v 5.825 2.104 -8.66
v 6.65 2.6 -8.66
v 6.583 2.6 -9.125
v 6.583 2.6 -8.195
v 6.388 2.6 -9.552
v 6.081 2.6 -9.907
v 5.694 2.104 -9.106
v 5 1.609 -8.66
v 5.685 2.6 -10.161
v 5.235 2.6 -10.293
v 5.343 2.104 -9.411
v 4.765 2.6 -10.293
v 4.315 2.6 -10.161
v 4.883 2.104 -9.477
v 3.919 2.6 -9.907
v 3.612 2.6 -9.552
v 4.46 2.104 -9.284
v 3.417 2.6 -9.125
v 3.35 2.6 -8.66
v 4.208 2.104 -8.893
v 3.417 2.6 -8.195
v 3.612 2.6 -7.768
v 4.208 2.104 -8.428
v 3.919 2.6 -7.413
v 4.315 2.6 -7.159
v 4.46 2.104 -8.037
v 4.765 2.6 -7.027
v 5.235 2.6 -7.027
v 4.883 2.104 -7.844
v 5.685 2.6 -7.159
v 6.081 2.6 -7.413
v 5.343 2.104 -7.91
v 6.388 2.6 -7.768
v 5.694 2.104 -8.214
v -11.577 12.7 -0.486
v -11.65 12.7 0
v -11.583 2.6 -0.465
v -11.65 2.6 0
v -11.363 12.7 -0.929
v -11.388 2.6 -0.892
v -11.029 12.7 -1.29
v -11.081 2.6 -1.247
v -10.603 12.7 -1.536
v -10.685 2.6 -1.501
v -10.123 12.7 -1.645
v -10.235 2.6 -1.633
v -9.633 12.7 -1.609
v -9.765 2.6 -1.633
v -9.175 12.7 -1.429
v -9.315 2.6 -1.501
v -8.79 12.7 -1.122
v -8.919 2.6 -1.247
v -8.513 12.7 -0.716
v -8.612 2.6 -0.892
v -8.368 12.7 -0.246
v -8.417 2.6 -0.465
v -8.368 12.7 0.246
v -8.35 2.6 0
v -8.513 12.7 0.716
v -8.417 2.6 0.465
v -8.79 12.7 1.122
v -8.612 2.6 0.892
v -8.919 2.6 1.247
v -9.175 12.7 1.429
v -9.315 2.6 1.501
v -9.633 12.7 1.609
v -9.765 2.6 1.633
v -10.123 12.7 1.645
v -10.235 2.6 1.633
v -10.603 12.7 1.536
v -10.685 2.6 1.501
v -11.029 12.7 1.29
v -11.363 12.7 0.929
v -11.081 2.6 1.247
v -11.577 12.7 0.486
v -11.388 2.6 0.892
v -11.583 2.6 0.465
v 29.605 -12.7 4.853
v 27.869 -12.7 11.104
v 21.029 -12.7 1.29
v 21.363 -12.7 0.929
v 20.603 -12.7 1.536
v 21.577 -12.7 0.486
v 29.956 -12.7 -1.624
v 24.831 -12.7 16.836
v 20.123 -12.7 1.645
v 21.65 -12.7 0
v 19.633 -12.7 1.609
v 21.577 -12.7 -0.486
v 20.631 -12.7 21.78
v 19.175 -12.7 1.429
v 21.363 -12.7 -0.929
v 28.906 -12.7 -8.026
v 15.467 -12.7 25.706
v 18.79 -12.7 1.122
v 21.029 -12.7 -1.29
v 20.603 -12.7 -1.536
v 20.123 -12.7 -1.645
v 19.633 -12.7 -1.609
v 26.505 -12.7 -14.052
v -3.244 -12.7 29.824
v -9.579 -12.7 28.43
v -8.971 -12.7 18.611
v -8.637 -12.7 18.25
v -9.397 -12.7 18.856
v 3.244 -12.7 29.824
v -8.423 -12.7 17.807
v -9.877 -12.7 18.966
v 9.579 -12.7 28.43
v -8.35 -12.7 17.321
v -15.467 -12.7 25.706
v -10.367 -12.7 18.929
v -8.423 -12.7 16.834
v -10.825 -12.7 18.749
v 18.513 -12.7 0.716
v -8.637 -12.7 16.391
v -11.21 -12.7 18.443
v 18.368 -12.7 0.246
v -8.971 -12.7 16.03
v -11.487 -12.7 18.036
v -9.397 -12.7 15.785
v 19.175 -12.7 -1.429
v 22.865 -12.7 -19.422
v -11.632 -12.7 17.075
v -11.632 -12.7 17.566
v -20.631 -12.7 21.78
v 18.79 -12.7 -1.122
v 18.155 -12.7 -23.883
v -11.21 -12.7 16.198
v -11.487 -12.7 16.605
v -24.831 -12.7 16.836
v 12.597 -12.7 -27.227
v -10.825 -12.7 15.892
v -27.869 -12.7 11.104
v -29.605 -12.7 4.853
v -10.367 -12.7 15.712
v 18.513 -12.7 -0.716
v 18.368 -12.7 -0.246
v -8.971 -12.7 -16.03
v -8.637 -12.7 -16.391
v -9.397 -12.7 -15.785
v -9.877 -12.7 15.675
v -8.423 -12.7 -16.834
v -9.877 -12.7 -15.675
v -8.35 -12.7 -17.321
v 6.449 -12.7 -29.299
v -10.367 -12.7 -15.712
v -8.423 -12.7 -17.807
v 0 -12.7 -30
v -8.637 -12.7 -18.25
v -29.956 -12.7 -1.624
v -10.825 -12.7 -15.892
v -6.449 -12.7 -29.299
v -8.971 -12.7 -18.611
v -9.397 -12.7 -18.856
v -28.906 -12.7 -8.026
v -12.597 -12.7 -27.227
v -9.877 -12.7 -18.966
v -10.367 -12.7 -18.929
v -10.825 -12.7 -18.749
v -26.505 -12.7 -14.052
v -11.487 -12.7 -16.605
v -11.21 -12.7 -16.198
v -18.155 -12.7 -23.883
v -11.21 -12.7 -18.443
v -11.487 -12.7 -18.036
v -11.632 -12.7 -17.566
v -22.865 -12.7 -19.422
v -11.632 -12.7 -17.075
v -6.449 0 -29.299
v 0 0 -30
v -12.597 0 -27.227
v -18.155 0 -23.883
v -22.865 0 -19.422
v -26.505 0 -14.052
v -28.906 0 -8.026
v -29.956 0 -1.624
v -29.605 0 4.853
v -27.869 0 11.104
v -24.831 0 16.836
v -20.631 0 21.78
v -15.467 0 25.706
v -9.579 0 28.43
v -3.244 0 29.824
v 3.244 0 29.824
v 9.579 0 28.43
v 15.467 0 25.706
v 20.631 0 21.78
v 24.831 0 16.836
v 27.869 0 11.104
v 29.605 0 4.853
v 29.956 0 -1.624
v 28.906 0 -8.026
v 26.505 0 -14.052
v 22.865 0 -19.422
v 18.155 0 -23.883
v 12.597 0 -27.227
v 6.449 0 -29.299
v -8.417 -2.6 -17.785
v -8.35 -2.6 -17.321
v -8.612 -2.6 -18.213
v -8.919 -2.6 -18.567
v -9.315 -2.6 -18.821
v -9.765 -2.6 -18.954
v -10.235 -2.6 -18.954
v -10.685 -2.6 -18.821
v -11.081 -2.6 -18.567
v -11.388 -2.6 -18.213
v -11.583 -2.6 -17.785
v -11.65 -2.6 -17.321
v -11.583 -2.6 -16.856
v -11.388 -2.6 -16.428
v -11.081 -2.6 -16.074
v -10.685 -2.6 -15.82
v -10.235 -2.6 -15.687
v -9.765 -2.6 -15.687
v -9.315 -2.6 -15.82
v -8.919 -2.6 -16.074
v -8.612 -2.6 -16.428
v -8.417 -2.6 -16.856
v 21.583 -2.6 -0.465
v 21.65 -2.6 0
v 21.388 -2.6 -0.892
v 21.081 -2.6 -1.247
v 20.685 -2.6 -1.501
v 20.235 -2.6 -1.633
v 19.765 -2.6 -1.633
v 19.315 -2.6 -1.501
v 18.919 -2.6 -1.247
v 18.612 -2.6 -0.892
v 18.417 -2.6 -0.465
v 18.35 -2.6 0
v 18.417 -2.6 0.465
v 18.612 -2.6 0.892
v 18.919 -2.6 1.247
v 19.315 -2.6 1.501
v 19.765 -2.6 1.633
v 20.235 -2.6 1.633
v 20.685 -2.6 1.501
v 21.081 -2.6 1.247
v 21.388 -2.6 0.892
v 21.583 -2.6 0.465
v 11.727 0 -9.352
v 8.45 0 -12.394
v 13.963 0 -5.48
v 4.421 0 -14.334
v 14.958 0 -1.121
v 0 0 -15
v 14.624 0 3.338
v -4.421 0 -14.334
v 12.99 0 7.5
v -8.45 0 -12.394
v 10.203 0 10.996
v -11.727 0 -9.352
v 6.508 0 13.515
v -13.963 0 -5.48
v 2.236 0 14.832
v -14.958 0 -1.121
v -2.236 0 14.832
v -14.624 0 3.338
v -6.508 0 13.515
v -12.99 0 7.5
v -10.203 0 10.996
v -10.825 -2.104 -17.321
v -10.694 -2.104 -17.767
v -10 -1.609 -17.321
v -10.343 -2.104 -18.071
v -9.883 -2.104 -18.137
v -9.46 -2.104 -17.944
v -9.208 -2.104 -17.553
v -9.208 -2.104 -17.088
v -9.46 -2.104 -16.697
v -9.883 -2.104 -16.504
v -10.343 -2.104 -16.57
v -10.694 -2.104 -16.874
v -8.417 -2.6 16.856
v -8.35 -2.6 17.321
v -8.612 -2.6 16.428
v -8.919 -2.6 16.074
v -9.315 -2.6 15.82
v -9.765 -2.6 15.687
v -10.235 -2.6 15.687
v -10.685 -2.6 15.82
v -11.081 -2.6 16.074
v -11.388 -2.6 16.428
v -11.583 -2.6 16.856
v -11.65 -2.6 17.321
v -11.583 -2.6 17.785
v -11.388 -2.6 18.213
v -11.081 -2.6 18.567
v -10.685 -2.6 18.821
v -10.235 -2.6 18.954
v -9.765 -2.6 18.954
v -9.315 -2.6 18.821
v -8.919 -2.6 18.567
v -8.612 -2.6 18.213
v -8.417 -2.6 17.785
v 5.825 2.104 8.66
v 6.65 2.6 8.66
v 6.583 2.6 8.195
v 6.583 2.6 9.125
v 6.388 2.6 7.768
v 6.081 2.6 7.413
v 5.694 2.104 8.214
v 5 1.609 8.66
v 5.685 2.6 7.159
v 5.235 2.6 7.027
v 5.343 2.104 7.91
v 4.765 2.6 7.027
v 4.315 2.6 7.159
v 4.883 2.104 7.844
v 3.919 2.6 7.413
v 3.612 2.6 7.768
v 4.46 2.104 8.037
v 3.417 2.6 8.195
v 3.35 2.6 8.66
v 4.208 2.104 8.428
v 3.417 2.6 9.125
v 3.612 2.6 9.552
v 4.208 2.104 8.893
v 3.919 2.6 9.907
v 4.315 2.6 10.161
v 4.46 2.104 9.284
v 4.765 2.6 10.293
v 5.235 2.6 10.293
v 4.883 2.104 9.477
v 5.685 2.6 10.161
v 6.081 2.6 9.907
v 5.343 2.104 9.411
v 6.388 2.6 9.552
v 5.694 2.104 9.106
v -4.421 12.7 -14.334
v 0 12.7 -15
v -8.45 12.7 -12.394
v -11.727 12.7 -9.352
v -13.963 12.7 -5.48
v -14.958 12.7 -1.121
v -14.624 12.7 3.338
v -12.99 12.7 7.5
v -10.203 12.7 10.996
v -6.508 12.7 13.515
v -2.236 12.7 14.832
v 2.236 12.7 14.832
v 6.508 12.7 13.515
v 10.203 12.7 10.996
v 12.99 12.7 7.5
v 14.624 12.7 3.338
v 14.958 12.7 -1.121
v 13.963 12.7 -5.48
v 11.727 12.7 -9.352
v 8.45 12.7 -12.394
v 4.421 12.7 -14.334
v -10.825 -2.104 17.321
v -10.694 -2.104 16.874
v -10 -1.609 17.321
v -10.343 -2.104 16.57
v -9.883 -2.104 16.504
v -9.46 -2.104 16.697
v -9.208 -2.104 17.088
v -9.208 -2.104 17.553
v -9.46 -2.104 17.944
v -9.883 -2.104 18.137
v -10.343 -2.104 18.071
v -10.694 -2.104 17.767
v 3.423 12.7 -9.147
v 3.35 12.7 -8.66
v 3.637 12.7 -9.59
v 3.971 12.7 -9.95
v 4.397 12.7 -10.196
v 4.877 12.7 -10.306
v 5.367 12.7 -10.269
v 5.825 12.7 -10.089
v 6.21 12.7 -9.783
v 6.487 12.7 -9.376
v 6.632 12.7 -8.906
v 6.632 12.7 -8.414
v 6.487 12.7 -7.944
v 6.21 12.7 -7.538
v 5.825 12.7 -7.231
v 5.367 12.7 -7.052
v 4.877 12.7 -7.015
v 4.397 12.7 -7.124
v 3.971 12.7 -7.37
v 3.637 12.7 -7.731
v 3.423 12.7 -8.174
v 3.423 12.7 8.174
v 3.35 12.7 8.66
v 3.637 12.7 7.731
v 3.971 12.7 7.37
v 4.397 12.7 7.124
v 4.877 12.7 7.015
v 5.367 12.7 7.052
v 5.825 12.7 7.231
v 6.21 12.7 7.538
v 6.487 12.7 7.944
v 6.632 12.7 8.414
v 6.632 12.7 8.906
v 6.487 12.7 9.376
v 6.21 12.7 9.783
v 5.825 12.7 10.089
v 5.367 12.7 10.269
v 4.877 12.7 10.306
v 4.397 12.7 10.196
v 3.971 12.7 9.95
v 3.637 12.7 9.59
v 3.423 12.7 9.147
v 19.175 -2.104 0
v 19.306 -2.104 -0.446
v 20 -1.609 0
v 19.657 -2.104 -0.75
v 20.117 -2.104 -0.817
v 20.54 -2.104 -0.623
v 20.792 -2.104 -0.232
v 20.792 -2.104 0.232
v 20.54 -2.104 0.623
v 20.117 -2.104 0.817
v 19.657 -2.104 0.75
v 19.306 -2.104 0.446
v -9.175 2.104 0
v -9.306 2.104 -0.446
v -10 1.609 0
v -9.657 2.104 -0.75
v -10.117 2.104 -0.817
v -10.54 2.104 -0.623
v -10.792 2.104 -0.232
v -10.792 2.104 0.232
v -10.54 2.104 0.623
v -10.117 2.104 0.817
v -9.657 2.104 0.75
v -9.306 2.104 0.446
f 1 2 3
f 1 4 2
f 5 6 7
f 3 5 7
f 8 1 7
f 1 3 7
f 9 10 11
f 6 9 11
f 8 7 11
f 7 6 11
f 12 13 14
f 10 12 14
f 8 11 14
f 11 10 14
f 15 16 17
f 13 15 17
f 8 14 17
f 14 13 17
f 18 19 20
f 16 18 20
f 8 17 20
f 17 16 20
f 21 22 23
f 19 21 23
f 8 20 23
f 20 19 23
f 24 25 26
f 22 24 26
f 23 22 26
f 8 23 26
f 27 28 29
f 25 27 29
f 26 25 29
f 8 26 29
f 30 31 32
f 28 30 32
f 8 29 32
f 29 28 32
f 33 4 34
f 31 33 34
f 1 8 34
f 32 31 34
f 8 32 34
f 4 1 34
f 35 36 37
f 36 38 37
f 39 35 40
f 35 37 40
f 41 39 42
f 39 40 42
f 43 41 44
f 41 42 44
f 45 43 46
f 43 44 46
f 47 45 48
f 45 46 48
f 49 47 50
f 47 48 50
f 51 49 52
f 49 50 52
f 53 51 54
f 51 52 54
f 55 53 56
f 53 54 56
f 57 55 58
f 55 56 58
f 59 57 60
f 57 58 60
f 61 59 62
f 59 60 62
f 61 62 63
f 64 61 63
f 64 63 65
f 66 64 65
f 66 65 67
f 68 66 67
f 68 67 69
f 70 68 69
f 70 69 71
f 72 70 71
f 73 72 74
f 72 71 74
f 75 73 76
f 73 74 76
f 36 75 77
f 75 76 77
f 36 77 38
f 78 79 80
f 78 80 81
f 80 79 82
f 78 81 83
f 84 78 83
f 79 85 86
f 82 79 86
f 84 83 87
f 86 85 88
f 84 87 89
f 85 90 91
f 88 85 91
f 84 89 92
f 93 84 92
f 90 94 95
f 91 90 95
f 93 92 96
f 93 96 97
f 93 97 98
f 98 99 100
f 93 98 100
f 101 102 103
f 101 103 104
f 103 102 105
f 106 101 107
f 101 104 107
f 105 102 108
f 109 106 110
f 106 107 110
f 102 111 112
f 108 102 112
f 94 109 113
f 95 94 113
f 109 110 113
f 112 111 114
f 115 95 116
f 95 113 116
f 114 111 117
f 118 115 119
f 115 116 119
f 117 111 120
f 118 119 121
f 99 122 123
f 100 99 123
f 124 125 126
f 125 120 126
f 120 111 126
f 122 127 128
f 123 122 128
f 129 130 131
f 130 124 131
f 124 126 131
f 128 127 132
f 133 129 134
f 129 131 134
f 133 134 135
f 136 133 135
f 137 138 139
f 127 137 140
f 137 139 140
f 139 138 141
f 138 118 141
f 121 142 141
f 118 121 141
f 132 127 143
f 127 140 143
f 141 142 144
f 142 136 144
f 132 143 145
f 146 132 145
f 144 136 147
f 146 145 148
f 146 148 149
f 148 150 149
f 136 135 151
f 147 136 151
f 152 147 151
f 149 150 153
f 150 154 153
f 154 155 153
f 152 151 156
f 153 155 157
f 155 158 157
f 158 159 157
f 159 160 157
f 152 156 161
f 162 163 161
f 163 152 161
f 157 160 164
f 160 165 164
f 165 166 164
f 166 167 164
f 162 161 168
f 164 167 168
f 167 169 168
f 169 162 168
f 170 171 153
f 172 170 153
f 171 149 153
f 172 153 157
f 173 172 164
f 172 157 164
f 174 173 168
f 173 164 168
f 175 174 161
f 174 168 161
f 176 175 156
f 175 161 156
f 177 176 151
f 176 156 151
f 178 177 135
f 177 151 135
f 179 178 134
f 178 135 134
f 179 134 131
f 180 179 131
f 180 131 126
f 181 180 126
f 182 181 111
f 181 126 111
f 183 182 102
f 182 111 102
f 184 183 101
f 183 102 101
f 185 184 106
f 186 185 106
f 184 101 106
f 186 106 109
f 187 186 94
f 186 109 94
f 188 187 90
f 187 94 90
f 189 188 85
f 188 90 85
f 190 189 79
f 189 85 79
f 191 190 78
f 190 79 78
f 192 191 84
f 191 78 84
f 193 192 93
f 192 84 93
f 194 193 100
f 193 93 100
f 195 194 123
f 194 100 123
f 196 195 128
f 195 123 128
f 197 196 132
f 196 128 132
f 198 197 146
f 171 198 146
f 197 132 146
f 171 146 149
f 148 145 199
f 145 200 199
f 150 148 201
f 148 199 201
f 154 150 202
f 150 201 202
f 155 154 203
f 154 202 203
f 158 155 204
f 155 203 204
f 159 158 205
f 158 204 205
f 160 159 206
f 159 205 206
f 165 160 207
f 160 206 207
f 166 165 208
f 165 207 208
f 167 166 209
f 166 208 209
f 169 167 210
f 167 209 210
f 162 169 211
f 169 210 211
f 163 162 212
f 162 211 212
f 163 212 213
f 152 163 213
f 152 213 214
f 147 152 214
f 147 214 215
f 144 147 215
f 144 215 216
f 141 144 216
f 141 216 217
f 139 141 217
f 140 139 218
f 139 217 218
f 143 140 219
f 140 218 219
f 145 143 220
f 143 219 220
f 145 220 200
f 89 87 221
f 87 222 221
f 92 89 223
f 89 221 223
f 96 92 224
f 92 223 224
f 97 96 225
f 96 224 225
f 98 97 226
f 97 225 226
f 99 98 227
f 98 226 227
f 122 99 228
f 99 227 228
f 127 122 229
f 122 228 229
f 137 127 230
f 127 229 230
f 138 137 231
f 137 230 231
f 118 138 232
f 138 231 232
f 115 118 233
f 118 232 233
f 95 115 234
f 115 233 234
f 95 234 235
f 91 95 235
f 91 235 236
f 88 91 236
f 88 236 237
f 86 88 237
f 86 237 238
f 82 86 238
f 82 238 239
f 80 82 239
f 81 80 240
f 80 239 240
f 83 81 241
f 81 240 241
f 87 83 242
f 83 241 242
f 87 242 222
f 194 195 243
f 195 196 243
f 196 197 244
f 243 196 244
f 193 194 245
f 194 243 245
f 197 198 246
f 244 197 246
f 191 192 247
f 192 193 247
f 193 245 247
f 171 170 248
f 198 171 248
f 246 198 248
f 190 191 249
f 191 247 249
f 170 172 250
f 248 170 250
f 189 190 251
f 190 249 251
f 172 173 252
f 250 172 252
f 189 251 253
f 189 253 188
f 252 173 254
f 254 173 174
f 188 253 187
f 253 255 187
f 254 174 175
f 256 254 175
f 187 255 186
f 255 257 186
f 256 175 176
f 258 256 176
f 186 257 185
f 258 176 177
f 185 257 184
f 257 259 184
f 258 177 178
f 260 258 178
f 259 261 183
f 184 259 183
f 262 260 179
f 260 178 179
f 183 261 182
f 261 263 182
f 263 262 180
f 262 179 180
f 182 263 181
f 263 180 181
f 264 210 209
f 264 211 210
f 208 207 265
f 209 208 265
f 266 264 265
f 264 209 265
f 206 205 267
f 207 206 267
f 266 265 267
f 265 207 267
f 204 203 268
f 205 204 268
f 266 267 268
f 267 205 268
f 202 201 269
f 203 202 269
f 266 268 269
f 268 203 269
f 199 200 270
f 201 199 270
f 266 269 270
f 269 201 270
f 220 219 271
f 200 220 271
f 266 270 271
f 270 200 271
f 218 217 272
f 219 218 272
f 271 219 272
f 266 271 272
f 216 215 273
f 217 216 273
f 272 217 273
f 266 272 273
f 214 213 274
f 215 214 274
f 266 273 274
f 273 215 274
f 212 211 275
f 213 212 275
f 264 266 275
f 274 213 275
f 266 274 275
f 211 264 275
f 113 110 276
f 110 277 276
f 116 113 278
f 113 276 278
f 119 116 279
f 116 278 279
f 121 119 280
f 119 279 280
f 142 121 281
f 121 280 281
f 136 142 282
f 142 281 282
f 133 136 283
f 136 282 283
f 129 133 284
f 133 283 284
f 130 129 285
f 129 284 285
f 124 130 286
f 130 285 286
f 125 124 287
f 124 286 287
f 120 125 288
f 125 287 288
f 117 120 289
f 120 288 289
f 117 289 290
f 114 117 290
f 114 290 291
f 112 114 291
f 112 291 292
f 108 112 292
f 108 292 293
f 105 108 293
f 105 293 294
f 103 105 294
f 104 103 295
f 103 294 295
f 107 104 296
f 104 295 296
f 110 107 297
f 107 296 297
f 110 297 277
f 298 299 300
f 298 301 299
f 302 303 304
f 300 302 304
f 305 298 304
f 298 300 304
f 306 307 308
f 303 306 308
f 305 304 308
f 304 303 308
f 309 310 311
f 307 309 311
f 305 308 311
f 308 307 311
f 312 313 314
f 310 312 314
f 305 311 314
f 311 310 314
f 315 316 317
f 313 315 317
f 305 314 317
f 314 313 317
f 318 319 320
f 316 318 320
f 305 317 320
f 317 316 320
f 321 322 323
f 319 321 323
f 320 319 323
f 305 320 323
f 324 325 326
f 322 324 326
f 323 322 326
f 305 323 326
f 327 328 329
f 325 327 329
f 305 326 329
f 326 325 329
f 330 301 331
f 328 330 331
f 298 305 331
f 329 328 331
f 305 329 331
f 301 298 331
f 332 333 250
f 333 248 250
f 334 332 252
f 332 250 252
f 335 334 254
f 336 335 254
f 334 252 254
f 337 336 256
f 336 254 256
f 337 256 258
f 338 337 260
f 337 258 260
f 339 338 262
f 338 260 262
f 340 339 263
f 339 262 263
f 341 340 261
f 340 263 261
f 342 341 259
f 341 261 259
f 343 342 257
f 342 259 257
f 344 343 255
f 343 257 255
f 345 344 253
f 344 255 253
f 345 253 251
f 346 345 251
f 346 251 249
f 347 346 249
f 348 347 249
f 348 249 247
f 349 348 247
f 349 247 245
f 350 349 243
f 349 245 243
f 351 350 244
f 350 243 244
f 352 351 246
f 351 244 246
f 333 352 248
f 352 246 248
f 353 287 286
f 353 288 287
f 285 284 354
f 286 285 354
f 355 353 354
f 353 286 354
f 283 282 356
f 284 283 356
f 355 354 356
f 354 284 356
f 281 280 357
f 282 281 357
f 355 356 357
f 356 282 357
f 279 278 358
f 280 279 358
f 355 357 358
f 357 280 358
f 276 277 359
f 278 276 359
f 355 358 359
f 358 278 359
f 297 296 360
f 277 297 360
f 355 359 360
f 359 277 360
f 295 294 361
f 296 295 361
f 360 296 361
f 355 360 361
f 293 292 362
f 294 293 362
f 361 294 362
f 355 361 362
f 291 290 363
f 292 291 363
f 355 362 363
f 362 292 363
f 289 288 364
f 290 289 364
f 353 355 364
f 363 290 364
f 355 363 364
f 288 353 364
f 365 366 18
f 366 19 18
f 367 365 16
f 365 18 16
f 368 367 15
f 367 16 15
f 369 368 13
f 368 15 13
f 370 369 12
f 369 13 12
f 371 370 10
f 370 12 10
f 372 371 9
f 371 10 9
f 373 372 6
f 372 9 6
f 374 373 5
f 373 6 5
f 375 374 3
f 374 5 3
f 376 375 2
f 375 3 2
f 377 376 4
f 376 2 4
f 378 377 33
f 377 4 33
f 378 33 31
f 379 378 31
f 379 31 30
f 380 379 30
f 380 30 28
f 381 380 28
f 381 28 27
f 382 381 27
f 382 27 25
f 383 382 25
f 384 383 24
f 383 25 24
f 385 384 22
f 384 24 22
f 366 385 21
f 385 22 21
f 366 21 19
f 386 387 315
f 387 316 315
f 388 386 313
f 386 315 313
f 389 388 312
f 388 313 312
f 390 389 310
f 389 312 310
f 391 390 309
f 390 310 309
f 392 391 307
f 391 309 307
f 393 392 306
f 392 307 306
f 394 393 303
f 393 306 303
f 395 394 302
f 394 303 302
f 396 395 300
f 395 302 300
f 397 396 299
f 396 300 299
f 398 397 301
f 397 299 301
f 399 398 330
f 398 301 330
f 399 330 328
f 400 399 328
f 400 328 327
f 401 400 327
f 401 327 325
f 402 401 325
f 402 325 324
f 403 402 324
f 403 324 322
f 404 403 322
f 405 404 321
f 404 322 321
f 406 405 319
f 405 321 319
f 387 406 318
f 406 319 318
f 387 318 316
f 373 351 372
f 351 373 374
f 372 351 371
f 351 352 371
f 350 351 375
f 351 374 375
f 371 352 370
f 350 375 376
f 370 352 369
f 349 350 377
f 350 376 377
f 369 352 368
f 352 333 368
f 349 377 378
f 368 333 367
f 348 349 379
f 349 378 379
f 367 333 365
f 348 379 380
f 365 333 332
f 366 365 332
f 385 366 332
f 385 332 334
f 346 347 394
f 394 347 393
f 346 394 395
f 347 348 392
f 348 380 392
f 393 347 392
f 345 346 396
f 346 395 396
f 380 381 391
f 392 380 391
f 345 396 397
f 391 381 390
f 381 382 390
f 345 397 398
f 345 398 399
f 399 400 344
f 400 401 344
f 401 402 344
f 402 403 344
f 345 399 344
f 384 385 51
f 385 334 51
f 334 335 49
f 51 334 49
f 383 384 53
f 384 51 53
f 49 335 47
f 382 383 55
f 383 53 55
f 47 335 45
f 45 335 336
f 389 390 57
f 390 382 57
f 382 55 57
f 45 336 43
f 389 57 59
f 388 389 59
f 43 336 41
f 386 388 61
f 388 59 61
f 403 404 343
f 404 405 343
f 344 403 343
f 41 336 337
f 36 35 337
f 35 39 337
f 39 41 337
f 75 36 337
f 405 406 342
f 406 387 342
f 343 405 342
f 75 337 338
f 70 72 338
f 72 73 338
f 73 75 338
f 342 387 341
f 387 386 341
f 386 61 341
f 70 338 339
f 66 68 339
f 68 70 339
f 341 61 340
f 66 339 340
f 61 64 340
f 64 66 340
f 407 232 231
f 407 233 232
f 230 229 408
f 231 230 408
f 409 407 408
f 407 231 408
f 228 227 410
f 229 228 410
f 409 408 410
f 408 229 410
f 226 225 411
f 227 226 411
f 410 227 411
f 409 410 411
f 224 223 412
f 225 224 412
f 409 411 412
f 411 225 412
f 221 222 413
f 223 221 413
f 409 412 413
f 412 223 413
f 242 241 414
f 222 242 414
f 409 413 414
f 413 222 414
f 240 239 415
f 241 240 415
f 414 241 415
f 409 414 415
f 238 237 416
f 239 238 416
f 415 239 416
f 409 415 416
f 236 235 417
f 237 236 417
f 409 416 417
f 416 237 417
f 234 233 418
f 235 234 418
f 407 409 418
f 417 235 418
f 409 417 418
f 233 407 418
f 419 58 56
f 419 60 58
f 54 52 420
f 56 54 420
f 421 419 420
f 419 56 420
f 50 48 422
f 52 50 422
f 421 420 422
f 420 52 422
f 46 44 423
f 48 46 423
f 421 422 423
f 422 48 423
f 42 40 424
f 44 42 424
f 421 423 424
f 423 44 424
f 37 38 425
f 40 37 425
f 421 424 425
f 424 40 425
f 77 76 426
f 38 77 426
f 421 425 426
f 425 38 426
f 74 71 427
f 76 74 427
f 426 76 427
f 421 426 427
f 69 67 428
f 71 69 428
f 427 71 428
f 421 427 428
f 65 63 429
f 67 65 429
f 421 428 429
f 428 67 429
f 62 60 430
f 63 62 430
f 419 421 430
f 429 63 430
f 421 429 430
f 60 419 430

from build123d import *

# Parameters (mm, degrees)
M4X0_7_TAPPED_HOLE1_D     = 3.3
M4X0_7_TAPPED_HOLE1_DEPTH = 10.1
M4X0_7_TAPPED_HOLE1_TIP   = 0.991420021
M4X0_7_TAPPED_HOLE2_D     = 3.3
M4X0_7_TAPPED_HOLE2_DEPTH = 10.1
M4X0_7_TAPPED_HOLE2_TIP   = 0.991420021


with BuildPart() as part:
    # Sketch1 → Revolve1 (revolve)
    with BuildSketch(Plane.XY, mode=Mode.PRIVATE) as revolve1_sk:
        Polygon((0, 12.7), (-15, 12.7), (-15, 0), (-30, 0), (-30, -12.7), (0, -12.7), align=None)
    revolve(revolve1_sk.sketch.rotate(Axis((0, -12.7, 0), (0, 1, 0)), 270), axis=Axis((0, -12.7, 0), (0, 1, 0)))

    # M4x0.7 Tapped Hole1
    with Locations(Plane(origin=(0, 12.7, 0), x_dir=(1, 0, 0), z_dir=(0, 1, 0))):
        with Locations((-10, 0), (5, 8.660254038), (5, -8.660254038)):
            Hole(M4X0_7_TAPPED_HOLE1_D / 2, depth=M4X0_7_TAPPED_HOLE1_DEPTH)
            with Locations((0, 0, -(M4X0_7_TAPPED_HOLE1_DEPTH + M4X0_7_TAPPED_HOLE1_TIP / 2))):  # 118° drill point
                Cone(0, M4X0_7_TAPPED_HOLE1_D / 2, M4X0_7_TAPPED_HOLE1_TIP, mode=Mode.SUBTRACT)

    # M4x0.7 Tapped Hole2
    with Locations(Plane(origin=(0, -12.7, 0), x_dir=(-1, 0, 0), z_dir=(0, -1, 0))):
        with Locations((-20, 0), (10, -17.320508076), (10, 17.320508076)):
            Hole(M4X0_7_TAPPED_HOLE2_D / 2, depth=M4X0_7_TAPPED_HOLE2_DEPTH)
            with Locations((0, 0, -(M4X0_7_TAPPED_HOLE2_DEPTH + M4X0_7_TAPPED_HOLE2_TIP / 2))):  # 118° drill point
                Cone(0, M4X0_7_TAPPED_HOLE2_D / 2, M4X0_7_TAPPED_HOLE2_TIP, mode=Mode.SUBTRACT)


solid = part.part
